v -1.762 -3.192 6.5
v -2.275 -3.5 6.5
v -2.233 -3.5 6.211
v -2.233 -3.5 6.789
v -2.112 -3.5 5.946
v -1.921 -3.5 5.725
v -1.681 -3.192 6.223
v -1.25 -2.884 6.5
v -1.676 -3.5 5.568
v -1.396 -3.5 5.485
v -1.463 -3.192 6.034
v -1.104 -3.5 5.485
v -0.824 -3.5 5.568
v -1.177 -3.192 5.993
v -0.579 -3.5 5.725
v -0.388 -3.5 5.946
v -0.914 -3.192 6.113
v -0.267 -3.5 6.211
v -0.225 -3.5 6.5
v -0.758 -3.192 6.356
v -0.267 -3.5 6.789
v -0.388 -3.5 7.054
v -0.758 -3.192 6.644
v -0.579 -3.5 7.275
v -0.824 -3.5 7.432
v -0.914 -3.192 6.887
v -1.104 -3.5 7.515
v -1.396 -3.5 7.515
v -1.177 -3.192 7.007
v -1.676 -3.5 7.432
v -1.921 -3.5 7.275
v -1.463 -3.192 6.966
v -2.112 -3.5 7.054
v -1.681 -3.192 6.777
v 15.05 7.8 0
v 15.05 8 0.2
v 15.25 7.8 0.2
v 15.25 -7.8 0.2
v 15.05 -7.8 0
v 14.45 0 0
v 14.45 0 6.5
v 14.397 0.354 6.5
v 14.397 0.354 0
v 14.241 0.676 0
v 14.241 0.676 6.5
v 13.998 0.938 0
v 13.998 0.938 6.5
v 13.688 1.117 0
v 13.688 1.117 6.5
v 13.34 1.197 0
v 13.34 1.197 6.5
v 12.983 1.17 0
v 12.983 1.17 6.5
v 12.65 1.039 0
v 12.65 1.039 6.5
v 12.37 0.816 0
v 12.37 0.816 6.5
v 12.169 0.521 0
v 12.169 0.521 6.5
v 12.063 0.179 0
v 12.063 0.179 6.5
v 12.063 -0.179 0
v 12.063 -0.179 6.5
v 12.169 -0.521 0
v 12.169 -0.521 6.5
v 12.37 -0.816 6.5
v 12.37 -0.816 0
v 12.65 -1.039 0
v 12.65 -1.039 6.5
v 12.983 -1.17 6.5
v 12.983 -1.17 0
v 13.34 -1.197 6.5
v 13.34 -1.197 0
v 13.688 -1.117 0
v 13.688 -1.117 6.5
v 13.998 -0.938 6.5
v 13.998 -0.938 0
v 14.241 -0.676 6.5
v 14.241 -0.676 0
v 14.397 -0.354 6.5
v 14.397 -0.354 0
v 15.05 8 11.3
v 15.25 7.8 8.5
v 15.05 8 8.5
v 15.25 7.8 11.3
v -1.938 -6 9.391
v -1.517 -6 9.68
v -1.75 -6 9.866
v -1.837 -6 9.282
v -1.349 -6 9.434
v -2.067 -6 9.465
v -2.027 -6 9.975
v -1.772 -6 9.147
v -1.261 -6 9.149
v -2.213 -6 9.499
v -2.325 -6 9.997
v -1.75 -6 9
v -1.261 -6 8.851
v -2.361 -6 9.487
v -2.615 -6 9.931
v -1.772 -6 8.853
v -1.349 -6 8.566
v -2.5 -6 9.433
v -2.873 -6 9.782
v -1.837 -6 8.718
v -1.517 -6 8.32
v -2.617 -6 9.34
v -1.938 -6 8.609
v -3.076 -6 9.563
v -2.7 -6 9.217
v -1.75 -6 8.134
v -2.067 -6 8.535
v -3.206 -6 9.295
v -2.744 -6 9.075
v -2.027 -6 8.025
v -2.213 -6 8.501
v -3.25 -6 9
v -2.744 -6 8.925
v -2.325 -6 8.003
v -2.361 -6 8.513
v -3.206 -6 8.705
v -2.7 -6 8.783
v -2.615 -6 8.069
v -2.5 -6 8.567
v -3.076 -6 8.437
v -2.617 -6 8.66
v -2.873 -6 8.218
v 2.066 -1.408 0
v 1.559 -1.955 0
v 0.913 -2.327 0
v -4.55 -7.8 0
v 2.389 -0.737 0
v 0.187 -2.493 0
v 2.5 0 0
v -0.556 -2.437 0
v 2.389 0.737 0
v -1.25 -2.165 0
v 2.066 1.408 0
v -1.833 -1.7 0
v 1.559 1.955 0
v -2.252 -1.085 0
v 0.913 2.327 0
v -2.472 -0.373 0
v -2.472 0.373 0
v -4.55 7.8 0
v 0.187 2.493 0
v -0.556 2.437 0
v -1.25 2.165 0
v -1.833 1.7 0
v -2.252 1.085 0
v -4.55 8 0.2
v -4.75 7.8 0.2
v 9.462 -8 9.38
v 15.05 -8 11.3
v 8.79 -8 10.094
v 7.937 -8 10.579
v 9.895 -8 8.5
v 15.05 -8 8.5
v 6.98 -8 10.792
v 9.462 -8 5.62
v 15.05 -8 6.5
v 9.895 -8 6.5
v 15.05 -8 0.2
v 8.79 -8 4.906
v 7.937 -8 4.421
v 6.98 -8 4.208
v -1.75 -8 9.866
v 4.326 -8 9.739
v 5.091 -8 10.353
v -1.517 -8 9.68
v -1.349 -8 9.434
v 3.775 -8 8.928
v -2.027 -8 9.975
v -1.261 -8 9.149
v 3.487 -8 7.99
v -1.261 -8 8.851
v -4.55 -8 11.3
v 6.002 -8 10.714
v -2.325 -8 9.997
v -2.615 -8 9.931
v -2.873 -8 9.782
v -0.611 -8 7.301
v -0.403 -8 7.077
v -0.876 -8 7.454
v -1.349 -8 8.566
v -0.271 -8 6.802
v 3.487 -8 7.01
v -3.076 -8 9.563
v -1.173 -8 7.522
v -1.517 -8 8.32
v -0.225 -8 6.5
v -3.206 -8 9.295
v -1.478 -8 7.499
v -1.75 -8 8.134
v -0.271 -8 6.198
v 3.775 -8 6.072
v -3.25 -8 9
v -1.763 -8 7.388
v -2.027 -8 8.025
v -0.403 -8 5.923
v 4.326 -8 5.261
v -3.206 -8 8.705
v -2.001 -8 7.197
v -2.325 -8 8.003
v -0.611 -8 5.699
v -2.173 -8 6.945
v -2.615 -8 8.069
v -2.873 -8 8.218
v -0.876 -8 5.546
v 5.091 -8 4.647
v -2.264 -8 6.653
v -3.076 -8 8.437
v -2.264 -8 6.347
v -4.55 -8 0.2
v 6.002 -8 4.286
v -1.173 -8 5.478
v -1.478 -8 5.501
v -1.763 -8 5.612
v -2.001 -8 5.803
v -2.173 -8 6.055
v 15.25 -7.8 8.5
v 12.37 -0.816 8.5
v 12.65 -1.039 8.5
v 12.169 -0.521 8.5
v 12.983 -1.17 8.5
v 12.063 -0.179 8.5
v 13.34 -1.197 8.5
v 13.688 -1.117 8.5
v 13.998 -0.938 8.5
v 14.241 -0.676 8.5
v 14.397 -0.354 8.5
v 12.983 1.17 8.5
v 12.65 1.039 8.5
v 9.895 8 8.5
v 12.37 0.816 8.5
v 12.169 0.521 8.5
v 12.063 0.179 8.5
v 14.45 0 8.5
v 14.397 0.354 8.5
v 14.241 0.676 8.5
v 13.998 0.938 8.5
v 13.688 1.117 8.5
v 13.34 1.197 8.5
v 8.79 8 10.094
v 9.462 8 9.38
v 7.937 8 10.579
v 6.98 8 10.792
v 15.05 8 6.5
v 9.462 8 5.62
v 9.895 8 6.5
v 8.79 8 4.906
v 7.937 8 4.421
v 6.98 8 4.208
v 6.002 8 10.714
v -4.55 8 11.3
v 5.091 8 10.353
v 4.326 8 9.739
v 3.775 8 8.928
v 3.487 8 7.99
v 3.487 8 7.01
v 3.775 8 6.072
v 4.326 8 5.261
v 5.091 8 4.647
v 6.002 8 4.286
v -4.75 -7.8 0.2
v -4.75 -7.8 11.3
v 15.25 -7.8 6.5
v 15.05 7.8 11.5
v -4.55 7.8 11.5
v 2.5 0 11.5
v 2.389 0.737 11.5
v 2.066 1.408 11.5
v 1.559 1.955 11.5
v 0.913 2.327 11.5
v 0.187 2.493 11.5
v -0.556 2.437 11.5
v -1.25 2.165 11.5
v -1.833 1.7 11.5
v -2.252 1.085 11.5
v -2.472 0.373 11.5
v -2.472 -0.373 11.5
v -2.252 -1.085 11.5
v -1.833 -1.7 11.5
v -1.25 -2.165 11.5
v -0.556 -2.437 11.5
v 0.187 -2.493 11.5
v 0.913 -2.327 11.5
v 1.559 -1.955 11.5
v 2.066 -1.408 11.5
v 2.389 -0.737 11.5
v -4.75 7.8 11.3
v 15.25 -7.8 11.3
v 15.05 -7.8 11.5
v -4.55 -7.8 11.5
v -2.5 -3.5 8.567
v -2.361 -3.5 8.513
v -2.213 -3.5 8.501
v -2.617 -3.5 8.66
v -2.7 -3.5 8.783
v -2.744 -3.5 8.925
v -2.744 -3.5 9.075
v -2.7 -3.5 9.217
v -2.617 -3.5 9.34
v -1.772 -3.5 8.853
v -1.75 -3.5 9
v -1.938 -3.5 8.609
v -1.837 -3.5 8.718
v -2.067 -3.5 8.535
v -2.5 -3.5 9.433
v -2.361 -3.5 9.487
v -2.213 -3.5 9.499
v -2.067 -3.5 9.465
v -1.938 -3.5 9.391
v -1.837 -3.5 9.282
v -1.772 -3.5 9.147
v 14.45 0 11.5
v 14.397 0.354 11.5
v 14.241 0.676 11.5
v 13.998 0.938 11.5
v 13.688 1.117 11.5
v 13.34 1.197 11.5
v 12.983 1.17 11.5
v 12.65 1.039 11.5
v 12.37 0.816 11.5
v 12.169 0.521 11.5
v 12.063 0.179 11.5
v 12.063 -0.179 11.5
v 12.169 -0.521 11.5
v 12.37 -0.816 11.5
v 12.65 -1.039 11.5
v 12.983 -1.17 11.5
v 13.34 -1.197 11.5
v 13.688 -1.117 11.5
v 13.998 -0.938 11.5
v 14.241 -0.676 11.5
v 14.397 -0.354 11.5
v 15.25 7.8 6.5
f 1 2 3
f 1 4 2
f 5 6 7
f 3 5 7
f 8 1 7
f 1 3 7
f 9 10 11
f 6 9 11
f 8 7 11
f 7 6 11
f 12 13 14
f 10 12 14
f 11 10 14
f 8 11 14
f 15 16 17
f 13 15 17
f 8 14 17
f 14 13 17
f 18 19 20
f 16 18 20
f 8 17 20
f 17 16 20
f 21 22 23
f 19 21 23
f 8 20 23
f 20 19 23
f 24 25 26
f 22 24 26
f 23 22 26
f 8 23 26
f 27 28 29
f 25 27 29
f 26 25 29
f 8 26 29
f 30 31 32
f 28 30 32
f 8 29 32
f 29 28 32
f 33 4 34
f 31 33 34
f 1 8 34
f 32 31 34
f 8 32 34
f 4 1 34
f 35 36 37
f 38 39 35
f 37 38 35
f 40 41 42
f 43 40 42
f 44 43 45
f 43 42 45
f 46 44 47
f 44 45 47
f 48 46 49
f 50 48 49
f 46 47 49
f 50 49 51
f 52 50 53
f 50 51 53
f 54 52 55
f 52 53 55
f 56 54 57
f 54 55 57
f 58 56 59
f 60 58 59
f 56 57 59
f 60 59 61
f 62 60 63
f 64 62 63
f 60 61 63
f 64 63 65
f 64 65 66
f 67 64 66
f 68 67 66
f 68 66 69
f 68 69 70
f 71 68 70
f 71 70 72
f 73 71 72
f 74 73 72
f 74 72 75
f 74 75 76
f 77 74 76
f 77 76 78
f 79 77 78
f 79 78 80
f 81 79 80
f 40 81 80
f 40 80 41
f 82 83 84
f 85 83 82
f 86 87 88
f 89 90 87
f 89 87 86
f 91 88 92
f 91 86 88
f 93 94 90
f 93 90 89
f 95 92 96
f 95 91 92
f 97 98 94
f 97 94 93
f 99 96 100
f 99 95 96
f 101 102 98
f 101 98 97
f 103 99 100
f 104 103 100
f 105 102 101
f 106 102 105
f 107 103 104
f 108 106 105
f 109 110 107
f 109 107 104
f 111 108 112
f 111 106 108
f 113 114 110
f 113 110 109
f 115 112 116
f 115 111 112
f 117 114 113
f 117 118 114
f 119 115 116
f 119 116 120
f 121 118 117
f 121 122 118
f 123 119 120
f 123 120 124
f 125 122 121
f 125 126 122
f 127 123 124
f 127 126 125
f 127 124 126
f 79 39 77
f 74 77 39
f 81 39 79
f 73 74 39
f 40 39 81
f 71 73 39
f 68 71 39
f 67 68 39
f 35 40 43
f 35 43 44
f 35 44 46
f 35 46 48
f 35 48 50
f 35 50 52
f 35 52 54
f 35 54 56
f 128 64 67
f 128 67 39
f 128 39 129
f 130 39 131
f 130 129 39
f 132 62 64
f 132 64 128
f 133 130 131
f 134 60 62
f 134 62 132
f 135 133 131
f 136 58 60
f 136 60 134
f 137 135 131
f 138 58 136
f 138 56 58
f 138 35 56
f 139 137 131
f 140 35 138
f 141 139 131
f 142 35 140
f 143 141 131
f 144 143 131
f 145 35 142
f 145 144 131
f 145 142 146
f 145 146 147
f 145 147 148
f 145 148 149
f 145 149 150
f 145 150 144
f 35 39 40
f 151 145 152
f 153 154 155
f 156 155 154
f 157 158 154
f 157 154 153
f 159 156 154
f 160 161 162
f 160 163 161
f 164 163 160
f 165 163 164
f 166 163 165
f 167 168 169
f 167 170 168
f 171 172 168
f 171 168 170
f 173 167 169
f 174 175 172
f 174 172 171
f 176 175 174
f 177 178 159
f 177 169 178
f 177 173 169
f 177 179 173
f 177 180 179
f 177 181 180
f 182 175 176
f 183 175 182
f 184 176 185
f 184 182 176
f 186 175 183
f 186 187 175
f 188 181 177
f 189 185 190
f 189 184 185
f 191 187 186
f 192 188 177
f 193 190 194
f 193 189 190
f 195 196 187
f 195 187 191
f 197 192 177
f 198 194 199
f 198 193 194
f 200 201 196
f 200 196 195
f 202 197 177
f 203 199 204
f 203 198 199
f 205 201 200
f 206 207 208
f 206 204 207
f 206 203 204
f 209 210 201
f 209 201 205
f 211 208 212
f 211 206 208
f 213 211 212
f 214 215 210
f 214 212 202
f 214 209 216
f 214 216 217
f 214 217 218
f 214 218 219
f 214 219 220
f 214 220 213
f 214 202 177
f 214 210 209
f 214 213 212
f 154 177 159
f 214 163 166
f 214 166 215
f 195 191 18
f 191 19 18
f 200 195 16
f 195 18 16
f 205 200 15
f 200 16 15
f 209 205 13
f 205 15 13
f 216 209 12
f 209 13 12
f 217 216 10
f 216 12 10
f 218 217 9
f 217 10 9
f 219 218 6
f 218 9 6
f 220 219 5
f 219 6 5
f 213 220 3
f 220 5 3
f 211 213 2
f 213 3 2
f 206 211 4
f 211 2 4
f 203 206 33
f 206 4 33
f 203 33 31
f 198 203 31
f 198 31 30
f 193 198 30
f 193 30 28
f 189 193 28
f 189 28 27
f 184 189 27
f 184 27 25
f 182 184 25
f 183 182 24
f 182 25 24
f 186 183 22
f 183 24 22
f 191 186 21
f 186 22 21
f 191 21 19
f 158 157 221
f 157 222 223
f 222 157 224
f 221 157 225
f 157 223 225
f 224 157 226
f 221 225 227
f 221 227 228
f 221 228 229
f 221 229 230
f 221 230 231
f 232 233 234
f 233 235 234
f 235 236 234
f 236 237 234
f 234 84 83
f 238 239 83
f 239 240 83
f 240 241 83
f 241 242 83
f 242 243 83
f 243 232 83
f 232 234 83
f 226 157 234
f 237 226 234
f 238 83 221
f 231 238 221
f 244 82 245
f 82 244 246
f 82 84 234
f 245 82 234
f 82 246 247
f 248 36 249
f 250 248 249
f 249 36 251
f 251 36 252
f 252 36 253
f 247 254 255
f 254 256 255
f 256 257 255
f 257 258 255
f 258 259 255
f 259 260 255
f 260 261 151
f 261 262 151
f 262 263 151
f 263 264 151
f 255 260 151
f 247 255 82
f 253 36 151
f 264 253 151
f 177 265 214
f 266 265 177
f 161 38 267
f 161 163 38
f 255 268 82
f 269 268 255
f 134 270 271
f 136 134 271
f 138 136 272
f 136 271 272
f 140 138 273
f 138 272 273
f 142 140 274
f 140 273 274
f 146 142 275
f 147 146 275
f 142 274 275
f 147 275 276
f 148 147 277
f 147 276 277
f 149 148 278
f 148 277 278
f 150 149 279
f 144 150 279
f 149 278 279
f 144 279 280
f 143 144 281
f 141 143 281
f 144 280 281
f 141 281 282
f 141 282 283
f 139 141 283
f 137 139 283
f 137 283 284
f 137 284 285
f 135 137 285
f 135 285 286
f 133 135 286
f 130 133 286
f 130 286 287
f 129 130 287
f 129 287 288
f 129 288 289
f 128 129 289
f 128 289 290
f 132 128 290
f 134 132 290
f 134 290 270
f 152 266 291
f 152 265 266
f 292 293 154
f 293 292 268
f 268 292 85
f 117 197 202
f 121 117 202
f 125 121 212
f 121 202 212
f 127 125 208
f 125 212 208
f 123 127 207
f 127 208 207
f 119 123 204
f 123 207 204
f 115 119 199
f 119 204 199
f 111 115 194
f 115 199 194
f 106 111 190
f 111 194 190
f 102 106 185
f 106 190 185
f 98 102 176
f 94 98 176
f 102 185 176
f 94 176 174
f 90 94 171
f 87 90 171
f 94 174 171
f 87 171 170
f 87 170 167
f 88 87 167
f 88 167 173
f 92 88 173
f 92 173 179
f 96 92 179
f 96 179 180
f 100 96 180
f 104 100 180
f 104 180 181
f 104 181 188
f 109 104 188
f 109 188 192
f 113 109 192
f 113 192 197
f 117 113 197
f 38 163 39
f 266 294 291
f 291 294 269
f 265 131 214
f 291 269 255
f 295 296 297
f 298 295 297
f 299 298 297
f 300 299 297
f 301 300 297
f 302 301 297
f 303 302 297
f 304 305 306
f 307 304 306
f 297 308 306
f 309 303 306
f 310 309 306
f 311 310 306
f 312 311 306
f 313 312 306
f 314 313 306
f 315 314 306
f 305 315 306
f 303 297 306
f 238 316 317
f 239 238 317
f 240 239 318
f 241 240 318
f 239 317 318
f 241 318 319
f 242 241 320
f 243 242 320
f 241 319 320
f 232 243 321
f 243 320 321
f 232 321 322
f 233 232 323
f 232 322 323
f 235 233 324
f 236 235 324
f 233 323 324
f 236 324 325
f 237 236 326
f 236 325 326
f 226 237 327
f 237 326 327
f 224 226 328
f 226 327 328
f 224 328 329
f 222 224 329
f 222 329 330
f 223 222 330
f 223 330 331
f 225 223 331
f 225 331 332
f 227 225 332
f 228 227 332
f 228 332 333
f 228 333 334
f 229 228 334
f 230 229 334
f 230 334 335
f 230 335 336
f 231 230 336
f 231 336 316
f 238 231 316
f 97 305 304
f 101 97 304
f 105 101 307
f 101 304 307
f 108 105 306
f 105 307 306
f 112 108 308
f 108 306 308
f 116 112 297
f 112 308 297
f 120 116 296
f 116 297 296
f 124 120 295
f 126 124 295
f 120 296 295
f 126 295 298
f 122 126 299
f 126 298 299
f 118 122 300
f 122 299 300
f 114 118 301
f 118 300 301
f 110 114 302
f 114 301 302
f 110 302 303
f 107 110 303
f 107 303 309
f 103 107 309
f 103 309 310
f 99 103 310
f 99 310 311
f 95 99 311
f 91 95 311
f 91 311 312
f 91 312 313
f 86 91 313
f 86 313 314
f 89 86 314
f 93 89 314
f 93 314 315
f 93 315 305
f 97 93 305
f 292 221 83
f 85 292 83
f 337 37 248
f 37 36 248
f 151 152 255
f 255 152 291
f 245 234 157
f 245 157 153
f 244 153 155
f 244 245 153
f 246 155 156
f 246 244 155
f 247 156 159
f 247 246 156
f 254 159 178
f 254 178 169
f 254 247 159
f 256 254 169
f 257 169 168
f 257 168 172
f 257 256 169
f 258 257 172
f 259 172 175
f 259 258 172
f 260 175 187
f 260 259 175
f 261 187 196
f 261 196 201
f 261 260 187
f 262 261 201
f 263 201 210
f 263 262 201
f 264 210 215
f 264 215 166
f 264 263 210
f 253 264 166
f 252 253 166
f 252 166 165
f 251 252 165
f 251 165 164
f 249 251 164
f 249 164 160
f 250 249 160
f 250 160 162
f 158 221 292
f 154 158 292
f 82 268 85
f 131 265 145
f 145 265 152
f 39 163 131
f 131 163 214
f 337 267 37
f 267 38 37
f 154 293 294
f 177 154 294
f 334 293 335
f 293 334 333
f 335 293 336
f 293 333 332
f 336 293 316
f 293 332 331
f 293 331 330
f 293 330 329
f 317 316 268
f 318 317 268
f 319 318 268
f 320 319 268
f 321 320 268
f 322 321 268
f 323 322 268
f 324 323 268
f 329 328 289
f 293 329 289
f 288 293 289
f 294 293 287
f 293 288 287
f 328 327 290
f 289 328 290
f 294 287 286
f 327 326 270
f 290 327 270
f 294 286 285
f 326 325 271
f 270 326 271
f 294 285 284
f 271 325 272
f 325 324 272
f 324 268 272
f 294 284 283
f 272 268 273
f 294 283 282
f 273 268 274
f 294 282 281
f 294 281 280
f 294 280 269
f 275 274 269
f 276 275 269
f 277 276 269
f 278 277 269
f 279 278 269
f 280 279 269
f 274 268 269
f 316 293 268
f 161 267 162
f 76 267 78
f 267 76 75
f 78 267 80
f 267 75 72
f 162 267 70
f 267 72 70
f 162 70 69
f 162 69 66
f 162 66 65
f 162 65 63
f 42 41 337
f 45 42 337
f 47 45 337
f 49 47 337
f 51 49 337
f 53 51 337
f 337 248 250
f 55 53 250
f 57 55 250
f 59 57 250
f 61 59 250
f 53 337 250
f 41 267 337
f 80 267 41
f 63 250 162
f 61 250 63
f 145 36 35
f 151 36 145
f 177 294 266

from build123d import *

# Parameters (mm, degrees)
SKETCH_1_W                    = 20
SKETCH_1_H                    = 16
EXTRUDE_1_DEPTH               = 11.5
CUT_EXTRUDE_1_DEPTH           = 25.916109247
SKETCH_3_W                    = 3.3
SKETCH_3_H                    = 16
HOLE_WIZARD_5_0_5_1_D         = 5
SKETCH_6_W                    = 0.8
SKETCH_6_H                    = 3
HOLE_WIZARD_2_4_2_4_1_D       = 2.4
HOLE_WIZARD_2_4_2_4_1_DEPTH   = 11.5
HOLE_WIZARD_2_05_2_05_1_D     = 2.05
HOLE_WIZARD_2_05_2_05_1_DEPTH = 4.5
HOLE_WIZARD_2_05_2_05_1_TIP   = 0.615882135
M2X0_41_D                     = 1
M2X0_41_DEPTH                 = 4.5
M2X0_41_CBORE_D               = 2
M2X0_41_CBORE_DEPTH           = 2
CHAMFER_1_SIZE                = 0.2


with BuildPart() as part:
    # Эскиз1 → Бобышка-Вытянуть1 (new body)
    with BuildSketch(Plane(origin=(0, 0, 0), x_dir=(-1, 0, 0), z_dir=(0, 0, -1))):
        with Locations((-5.25, 0)):
            Rectangle(SKETCH_1_W, SKETCH_1_H)
    extrude(amount=-EXTRUDE_1_DEPTH)

    # Эскиз2 → Вырез-Вытянуть1 (cut, through all)
    with BuildSketch(Plane(origin=(0, 8, 0), x_dir=(-1, 0, 0), z_dir=(0, 1, 0))):
        with BuildLine():
            Line((-15.25, 8.5), (-15.25, 6.5))
            Line((-15.25, 6.5), (-9.894837039, 6.5))
            ThreePointArc((-9.894837039, 6.5), (-10.05, 7.5), (-9.894837039, 8.5))
            Line((-9.894837039, 8.5), (-15.25, 8.5))
        make_face()
    extrude(amount=-CUT_EXTRUDE_1_DEPTH, mode=Mode.SUBTRACT)

    # Эскиз3 → Вырез-Повернуть1 (revolve, cut)
    with BuildSketch(Plane.XY.offset(7.5)):
        with Locations((8.4, 0)):
            Rectangle(SKETCH_3_W, SKETCH_3_H)
    revolve(axis=Axis((6.75, 8, 7.5), (0, -1, 0)), mode=Mode.SUBTRACT)

    # Диаметр отверстия Ø5.0 (5)1 (through all)
    with Locations(Plane(origin=(0, 0, 0), x_dir=(-1, 0, 0), z_dir=(0, 0, -1))):
        with Locations((0, 0)):
            Hole(HOLE_WIZARD_5_0_5_1_D / 2)

    # Эскиз6 → Диаметр отверстия Ø1.6 (1.6)1 (revolve, cut)
    with BuildSketch(Plane(origin=(13.25, 0, 8.5), x_dir=(0, 1, 0), z_dir=(1, 0, 0))):
        with Locations((0.4, 1.5)):
            Rectangle(SKETCH_6_W, SKETCH_6_H)
    revolve(axis=Axis((13.25, 0, 2.15), (0, 0, 1)), mode=Mode.SUBTRACT)

    # Диаметр отверстия Ø2.4 (2.4)1
    with Locations(Plane(origin=(0, 0, 0), x_dir=(-1, 0, 0), z_dir=(0, 0, -1))):
        with Locations((-13.25, 0)):
            Hole(HOLE_WIZARD_2_4_2_4_1_D / 2, depth=HOLE_WIZARD_2_4_2_4_1_DEPTH)

    # Диаметр отверстия Ø2.05 (2.05)1
    with Locations(Plane(origin=(0, -8, 0), x_dir=(-1, 0, 0), z_dir=(0, -1, 0))):
        with Locations((1.25, -6.5)):
            Hole(HOLE_WIZARD_2_05_2_05_1_D / 2, depth=HOLE_WIZARD_2_05_2_05_1_DEPTH)
            with Locations((0, 0, -(HOLE_WIZARD_2_05_2_05_1_DEPTH + HOLE_WIZARD_2_05_2_05_1_TIP / 2))):  # 118° drill point
                Cone(0, HOLE_WIZARD_2_05_2_05_1_D / 2, HOLE_WIZARD_2_05_2_05_1_TIP, mode=Mode.SUBTRACT)

    # Отверстие обработанное метчиком M2x0.41
    with Locations(Plane(origin=(0, -8, 0), x_dir=(-1, 0, 0), z_dir=(0, -1, 0))):
        with Locations((2.25, -9)):
            CounterBoreHole(M2X0_41_D / 2, M2X0_41_CBORE_D / 2, M2X0_41_CBORE_DEPTH, depth=M2X0_41_DEPTH)

    # Фаска1
    chamfer_1_edges = [part.edges().sort_by_distance(p)[0] for p in [
        (-4.75, 0, 11.5),
        (5.25, 8, 11.5),
        (15.25, -8, 3.25),
        (15.25, 8, 3.25),
        (15.25, 0, 11.5),
        (5.25, 8, 0),
        (-4.75, 0, 0),
        (5.25, -8, 0),
        (15.25, 0, 0),
        (5.25, -8, 11.5),
        (15.25, 8, 10),
        (-4.75, 8, 5.75),
        (-4.75, -8, 5.75),
        (15.25, -8, 10),
    ]]
    chamfer(chamfer_1_edges, length=CHAMFER_1_SIZE)


solid = part.part
